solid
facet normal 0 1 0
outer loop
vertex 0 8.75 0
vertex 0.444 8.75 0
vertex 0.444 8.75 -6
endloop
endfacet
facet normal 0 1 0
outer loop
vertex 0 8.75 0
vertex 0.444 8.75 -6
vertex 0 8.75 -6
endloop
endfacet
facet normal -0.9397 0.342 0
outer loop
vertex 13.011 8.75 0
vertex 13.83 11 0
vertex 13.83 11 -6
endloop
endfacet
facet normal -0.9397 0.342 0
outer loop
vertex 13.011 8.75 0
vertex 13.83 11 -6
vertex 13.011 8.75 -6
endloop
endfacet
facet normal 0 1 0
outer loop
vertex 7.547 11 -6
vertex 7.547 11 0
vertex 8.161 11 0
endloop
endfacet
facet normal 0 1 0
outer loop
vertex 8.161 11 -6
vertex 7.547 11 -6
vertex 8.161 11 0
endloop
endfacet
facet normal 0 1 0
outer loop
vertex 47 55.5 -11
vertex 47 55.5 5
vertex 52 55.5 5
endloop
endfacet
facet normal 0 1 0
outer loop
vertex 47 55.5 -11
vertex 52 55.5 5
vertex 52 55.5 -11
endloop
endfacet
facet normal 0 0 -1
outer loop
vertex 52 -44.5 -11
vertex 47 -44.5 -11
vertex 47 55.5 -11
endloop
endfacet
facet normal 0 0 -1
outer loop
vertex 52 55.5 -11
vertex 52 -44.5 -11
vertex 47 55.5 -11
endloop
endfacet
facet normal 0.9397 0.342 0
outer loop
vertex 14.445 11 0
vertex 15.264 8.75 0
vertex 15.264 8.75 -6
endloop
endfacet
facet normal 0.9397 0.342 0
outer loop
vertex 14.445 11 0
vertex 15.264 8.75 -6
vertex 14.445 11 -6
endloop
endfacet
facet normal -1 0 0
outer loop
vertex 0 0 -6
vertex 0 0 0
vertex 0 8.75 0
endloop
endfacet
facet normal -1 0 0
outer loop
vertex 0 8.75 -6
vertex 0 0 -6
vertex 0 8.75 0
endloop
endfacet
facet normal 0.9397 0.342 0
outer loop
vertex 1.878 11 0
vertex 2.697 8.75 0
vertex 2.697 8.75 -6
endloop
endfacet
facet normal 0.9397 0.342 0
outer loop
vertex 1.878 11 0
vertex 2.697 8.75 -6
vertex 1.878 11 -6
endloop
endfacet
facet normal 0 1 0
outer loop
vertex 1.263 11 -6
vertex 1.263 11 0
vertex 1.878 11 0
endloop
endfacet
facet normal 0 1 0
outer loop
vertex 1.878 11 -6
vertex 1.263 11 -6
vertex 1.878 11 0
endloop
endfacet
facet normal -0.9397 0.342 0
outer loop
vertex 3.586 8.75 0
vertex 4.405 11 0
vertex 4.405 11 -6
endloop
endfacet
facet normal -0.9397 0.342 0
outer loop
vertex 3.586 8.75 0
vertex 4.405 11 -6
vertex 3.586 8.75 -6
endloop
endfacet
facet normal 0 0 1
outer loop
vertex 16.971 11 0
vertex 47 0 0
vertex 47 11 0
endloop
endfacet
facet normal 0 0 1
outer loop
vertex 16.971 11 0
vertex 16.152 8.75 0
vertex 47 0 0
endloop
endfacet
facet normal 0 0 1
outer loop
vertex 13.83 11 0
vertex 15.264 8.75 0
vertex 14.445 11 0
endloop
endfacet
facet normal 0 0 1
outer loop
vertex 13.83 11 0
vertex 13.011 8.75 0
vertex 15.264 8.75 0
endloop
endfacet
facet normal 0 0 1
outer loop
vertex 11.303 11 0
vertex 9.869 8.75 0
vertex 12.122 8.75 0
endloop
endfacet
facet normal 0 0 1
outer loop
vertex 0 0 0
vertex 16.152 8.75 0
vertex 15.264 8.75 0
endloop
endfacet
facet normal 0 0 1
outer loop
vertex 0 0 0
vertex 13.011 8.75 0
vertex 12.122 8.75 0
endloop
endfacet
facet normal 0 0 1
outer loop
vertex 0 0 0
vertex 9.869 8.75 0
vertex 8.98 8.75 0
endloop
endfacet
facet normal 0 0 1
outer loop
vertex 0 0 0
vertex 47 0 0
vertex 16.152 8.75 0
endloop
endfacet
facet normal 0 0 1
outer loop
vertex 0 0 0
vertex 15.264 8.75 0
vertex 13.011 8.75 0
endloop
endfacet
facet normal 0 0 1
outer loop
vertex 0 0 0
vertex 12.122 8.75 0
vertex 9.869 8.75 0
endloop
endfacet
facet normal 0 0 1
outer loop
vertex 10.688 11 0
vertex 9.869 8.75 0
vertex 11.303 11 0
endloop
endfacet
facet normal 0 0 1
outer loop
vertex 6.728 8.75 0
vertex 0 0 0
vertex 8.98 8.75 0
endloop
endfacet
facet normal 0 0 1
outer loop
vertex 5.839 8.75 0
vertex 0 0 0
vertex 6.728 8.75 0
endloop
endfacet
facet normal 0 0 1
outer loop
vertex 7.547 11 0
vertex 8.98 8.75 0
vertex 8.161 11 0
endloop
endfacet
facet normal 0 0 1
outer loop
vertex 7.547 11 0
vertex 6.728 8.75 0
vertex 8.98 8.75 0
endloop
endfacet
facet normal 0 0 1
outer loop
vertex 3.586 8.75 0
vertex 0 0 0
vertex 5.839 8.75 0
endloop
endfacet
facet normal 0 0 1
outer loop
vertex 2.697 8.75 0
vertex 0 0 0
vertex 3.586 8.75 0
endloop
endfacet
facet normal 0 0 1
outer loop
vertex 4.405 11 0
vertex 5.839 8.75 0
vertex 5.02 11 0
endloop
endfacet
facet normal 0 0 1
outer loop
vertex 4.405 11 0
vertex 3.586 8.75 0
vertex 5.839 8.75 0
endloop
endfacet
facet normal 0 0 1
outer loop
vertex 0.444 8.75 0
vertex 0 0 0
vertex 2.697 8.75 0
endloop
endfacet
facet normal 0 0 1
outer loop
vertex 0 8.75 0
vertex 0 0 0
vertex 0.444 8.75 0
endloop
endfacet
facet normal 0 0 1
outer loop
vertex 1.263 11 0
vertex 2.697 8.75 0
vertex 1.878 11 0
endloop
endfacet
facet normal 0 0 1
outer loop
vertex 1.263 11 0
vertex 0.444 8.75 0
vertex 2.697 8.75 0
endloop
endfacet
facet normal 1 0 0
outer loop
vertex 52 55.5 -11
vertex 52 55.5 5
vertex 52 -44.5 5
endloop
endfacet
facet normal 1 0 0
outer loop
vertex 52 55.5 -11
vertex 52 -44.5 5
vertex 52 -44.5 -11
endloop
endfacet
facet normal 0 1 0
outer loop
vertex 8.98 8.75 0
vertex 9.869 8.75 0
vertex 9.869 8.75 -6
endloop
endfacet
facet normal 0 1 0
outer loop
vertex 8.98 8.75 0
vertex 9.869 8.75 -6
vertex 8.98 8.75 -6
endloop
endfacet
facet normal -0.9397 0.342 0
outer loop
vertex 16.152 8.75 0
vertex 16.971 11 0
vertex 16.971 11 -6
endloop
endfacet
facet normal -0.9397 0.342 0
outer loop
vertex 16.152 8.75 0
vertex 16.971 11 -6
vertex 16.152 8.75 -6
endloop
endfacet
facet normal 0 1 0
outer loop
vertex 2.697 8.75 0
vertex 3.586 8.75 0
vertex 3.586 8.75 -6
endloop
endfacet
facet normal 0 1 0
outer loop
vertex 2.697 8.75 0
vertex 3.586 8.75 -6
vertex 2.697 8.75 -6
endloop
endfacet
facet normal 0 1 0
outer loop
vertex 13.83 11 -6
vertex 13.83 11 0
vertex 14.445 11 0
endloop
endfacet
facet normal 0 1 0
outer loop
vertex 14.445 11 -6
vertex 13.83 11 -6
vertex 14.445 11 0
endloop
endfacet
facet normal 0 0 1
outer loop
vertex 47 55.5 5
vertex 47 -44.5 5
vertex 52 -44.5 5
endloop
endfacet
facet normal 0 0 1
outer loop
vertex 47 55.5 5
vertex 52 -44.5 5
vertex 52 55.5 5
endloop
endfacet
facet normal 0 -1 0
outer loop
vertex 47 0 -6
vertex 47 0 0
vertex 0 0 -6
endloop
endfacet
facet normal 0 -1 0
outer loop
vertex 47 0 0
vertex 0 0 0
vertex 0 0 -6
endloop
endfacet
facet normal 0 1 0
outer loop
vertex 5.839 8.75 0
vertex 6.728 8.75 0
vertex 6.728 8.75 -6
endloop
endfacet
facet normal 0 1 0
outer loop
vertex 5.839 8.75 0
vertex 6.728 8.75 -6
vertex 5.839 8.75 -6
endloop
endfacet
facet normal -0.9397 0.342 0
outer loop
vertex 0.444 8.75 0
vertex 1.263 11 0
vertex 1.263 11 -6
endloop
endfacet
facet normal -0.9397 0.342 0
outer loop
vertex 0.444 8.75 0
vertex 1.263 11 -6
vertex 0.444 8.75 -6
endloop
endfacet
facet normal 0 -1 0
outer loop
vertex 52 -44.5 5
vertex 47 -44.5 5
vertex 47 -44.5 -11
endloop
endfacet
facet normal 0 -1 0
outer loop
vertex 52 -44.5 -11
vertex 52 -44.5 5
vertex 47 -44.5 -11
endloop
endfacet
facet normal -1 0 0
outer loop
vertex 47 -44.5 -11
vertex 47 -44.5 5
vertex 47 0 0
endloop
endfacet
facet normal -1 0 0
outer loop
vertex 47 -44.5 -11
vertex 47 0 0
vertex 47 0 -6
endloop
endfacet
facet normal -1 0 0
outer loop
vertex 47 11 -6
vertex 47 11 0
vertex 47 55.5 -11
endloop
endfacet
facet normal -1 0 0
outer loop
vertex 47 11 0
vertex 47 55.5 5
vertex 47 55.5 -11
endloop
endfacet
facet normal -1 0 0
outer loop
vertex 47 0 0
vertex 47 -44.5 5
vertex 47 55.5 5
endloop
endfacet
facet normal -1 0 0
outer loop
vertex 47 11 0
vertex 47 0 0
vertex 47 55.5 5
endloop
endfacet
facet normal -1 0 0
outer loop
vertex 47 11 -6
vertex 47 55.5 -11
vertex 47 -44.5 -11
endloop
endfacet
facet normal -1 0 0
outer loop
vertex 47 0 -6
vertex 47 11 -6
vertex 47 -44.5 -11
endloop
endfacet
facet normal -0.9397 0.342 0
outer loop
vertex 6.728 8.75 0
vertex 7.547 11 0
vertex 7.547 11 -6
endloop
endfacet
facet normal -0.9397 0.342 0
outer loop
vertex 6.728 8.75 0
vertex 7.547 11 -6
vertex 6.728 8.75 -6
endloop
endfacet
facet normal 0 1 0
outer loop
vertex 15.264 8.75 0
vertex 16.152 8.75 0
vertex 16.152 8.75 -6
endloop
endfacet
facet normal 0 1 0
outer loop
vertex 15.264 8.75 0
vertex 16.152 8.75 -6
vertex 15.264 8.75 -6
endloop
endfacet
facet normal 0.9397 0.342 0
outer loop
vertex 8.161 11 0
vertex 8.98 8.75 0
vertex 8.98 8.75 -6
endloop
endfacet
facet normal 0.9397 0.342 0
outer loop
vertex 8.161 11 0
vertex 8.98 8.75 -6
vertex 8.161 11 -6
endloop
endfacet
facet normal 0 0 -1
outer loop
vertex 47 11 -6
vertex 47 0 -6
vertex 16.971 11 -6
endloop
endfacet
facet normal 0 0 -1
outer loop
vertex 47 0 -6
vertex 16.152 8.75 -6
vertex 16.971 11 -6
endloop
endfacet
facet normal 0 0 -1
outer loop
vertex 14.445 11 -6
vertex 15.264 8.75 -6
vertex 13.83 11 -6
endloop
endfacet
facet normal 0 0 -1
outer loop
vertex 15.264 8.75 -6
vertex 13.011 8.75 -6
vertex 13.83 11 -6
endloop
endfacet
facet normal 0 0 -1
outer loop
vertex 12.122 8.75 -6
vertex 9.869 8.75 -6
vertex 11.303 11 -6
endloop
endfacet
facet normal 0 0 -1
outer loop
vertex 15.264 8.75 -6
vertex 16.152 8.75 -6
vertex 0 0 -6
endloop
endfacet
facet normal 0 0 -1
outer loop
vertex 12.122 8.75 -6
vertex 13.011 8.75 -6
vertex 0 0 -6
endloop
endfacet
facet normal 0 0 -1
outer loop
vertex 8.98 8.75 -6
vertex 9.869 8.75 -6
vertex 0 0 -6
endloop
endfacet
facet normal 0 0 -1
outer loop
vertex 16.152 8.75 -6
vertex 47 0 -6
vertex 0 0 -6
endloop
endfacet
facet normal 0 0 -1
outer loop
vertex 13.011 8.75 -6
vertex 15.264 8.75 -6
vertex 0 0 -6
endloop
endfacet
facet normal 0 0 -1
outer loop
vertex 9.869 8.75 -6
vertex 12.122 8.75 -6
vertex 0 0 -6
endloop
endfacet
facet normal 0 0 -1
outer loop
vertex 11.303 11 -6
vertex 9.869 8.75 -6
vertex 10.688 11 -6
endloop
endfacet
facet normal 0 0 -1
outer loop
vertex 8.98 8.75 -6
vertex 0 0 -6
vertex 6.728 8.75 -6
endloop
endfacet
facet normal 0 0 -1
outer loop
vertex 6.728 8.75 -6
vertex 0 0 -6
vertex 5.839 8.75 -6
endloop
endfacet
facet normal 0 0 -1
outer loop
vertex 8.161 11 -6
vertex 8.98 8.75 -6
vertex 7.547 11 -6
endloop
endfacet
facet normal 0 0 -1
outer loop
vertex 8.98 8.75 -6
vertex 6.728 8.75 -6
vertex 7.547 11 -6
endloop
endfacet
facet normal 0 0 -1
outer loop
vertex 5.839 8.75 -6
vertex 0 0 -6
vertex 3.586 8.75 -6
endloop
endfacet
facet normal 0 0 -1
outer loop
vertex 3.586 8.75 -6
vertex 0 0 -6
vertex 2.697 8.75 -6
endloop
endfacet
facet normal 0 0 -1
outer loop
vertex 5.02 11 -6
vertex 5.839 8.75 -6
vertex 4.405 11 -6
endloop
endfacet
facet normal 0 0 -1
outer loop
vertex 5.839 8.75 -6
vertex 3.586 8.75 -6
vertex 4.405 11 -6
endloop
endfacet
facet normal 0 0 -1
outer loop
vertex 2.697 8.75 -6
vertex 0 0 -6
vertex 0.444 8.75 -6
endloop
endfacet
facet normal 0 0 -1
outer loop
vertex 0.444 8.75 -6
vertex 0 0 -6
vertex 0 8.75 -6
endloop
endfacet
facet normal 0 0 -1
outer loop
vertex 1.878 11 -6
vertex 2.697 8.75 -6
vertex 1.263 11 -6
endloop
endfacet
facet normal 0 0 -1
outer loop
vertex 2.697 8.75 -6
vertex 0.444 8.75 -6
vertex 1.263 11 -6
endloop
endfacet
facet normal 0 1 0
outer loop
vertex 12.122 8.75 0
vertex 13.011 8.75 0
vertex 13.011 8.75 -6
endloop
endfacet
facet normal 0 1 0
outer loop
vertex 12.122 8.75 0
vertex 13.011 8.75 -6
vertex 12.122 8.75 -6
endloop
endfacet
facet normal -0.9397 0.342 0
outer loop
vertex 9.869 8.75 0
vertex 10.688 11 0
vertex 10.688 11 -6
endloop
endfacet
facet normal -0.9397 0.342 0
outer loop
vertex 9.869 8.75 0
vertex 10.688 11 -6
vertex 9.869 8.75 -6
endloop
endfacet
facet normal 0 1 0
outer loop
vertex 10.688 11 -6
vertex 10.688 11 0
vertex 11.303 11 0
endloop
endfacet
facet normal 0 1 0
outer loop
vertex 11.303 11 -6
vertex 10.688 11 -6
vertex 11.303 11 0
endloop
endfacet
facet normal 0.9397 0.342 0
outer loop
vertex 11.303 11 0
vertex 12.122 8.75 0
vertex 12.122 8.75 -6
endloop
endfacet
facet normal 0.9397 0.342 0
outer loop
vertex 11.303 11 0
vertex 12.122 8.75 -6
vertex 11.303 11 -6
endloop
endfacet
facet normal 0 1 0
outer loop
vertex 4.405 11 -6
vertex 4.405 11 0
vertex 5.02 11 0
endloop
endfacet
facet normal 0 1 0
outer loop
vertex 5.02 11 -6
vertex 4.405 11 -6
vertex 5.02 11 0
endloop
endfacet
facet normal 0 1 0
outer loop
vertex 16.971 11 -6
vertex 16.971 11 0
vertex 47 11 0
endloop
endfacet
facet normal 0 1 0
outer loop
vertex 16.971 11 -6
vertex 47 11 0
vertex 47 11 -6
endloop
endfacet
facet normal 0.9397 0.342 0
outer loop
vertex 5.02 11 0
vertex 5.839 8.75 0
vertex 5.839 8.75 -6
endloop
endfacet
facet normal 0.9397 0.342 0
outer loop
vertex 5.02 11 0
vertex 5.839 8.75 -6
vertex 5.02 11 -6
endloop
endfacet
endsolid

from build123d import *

# Parameters (mm, degrees)
BLANKSKE_W        = 17
BLANKSKE_H        = 11
BLANK_DEPTH       = 6
TOOTHCUTSIM_DEPTH = 22.118712082
TEETHCUTS_COUNT   = 6
TEETHCUTS_PITCH   = 3.14159265
SKETCH_1_W        = 6
SKETCH_1_H        = 11
EXTRUDE_1_DEPTH   = 30
SKETCH_2_W        = 16
SKETCH_2_H        = 100
EXTRUDE_2_DEPTH   = 5


with BuildPart() as part:
    # BlankSke → Blank (new body)
    with BuildSketch(Plane.XY):
        with Locations((8.5, 5.5)):
            Rectangle(BLANKSKE_W, BLANKSKE_H)
    extrude(amount=-BLANK_DEPTH)

    # TooCutSkeSim → ToothCutSim (cut, through all)
    with BuildSketch(Plane.XY):
        Polygon((0.44443537, 8.75), (-0.44443537, 8.75), (-1.272613241, 11.0254), (1.272613241, 11.0254), align=None)
    toothcutsim = extrude(amount=-TOOTHCUTSIM_DEPTH, mode=Mode.SUBTRACT)

    # TeethCuts: ToothCutSim ×6
    with Locations(*[(i * TEETHCUTS_PITCH, 0, 0) for i in range(1, TEETHCUTS_COUNT)]):
        add(toothcutsim, mode=Mode.SUBTRACT)

    # 草图1 → 凸台-拉伸1 (add)
    with BuildSketch(Plane(origin=(17, 0, 0), x_dir=(0, 0, -1), z_dir=(1, 0, 0))):
        with Locations((3, 5.5)):
            Rectangle(SKETCH_1_W, SKETCH_1_H)
    extrude(amount=EXTRUDE_1_DEPTH)

    # 草图2 → 凸台-拉伸2 (add)
    with BuildSketch(Plane(origin=(47, 0, 0), x_dir=(0, 0, -1), z_dir=(1, 0, 0))):
        with Locations((3, 5.5)):
            Rectangle(SKETCH_2_W, SKETCH_2_H)
    extrude(amount=EXTRUDE_2_DEPTH)


solid = part.part
